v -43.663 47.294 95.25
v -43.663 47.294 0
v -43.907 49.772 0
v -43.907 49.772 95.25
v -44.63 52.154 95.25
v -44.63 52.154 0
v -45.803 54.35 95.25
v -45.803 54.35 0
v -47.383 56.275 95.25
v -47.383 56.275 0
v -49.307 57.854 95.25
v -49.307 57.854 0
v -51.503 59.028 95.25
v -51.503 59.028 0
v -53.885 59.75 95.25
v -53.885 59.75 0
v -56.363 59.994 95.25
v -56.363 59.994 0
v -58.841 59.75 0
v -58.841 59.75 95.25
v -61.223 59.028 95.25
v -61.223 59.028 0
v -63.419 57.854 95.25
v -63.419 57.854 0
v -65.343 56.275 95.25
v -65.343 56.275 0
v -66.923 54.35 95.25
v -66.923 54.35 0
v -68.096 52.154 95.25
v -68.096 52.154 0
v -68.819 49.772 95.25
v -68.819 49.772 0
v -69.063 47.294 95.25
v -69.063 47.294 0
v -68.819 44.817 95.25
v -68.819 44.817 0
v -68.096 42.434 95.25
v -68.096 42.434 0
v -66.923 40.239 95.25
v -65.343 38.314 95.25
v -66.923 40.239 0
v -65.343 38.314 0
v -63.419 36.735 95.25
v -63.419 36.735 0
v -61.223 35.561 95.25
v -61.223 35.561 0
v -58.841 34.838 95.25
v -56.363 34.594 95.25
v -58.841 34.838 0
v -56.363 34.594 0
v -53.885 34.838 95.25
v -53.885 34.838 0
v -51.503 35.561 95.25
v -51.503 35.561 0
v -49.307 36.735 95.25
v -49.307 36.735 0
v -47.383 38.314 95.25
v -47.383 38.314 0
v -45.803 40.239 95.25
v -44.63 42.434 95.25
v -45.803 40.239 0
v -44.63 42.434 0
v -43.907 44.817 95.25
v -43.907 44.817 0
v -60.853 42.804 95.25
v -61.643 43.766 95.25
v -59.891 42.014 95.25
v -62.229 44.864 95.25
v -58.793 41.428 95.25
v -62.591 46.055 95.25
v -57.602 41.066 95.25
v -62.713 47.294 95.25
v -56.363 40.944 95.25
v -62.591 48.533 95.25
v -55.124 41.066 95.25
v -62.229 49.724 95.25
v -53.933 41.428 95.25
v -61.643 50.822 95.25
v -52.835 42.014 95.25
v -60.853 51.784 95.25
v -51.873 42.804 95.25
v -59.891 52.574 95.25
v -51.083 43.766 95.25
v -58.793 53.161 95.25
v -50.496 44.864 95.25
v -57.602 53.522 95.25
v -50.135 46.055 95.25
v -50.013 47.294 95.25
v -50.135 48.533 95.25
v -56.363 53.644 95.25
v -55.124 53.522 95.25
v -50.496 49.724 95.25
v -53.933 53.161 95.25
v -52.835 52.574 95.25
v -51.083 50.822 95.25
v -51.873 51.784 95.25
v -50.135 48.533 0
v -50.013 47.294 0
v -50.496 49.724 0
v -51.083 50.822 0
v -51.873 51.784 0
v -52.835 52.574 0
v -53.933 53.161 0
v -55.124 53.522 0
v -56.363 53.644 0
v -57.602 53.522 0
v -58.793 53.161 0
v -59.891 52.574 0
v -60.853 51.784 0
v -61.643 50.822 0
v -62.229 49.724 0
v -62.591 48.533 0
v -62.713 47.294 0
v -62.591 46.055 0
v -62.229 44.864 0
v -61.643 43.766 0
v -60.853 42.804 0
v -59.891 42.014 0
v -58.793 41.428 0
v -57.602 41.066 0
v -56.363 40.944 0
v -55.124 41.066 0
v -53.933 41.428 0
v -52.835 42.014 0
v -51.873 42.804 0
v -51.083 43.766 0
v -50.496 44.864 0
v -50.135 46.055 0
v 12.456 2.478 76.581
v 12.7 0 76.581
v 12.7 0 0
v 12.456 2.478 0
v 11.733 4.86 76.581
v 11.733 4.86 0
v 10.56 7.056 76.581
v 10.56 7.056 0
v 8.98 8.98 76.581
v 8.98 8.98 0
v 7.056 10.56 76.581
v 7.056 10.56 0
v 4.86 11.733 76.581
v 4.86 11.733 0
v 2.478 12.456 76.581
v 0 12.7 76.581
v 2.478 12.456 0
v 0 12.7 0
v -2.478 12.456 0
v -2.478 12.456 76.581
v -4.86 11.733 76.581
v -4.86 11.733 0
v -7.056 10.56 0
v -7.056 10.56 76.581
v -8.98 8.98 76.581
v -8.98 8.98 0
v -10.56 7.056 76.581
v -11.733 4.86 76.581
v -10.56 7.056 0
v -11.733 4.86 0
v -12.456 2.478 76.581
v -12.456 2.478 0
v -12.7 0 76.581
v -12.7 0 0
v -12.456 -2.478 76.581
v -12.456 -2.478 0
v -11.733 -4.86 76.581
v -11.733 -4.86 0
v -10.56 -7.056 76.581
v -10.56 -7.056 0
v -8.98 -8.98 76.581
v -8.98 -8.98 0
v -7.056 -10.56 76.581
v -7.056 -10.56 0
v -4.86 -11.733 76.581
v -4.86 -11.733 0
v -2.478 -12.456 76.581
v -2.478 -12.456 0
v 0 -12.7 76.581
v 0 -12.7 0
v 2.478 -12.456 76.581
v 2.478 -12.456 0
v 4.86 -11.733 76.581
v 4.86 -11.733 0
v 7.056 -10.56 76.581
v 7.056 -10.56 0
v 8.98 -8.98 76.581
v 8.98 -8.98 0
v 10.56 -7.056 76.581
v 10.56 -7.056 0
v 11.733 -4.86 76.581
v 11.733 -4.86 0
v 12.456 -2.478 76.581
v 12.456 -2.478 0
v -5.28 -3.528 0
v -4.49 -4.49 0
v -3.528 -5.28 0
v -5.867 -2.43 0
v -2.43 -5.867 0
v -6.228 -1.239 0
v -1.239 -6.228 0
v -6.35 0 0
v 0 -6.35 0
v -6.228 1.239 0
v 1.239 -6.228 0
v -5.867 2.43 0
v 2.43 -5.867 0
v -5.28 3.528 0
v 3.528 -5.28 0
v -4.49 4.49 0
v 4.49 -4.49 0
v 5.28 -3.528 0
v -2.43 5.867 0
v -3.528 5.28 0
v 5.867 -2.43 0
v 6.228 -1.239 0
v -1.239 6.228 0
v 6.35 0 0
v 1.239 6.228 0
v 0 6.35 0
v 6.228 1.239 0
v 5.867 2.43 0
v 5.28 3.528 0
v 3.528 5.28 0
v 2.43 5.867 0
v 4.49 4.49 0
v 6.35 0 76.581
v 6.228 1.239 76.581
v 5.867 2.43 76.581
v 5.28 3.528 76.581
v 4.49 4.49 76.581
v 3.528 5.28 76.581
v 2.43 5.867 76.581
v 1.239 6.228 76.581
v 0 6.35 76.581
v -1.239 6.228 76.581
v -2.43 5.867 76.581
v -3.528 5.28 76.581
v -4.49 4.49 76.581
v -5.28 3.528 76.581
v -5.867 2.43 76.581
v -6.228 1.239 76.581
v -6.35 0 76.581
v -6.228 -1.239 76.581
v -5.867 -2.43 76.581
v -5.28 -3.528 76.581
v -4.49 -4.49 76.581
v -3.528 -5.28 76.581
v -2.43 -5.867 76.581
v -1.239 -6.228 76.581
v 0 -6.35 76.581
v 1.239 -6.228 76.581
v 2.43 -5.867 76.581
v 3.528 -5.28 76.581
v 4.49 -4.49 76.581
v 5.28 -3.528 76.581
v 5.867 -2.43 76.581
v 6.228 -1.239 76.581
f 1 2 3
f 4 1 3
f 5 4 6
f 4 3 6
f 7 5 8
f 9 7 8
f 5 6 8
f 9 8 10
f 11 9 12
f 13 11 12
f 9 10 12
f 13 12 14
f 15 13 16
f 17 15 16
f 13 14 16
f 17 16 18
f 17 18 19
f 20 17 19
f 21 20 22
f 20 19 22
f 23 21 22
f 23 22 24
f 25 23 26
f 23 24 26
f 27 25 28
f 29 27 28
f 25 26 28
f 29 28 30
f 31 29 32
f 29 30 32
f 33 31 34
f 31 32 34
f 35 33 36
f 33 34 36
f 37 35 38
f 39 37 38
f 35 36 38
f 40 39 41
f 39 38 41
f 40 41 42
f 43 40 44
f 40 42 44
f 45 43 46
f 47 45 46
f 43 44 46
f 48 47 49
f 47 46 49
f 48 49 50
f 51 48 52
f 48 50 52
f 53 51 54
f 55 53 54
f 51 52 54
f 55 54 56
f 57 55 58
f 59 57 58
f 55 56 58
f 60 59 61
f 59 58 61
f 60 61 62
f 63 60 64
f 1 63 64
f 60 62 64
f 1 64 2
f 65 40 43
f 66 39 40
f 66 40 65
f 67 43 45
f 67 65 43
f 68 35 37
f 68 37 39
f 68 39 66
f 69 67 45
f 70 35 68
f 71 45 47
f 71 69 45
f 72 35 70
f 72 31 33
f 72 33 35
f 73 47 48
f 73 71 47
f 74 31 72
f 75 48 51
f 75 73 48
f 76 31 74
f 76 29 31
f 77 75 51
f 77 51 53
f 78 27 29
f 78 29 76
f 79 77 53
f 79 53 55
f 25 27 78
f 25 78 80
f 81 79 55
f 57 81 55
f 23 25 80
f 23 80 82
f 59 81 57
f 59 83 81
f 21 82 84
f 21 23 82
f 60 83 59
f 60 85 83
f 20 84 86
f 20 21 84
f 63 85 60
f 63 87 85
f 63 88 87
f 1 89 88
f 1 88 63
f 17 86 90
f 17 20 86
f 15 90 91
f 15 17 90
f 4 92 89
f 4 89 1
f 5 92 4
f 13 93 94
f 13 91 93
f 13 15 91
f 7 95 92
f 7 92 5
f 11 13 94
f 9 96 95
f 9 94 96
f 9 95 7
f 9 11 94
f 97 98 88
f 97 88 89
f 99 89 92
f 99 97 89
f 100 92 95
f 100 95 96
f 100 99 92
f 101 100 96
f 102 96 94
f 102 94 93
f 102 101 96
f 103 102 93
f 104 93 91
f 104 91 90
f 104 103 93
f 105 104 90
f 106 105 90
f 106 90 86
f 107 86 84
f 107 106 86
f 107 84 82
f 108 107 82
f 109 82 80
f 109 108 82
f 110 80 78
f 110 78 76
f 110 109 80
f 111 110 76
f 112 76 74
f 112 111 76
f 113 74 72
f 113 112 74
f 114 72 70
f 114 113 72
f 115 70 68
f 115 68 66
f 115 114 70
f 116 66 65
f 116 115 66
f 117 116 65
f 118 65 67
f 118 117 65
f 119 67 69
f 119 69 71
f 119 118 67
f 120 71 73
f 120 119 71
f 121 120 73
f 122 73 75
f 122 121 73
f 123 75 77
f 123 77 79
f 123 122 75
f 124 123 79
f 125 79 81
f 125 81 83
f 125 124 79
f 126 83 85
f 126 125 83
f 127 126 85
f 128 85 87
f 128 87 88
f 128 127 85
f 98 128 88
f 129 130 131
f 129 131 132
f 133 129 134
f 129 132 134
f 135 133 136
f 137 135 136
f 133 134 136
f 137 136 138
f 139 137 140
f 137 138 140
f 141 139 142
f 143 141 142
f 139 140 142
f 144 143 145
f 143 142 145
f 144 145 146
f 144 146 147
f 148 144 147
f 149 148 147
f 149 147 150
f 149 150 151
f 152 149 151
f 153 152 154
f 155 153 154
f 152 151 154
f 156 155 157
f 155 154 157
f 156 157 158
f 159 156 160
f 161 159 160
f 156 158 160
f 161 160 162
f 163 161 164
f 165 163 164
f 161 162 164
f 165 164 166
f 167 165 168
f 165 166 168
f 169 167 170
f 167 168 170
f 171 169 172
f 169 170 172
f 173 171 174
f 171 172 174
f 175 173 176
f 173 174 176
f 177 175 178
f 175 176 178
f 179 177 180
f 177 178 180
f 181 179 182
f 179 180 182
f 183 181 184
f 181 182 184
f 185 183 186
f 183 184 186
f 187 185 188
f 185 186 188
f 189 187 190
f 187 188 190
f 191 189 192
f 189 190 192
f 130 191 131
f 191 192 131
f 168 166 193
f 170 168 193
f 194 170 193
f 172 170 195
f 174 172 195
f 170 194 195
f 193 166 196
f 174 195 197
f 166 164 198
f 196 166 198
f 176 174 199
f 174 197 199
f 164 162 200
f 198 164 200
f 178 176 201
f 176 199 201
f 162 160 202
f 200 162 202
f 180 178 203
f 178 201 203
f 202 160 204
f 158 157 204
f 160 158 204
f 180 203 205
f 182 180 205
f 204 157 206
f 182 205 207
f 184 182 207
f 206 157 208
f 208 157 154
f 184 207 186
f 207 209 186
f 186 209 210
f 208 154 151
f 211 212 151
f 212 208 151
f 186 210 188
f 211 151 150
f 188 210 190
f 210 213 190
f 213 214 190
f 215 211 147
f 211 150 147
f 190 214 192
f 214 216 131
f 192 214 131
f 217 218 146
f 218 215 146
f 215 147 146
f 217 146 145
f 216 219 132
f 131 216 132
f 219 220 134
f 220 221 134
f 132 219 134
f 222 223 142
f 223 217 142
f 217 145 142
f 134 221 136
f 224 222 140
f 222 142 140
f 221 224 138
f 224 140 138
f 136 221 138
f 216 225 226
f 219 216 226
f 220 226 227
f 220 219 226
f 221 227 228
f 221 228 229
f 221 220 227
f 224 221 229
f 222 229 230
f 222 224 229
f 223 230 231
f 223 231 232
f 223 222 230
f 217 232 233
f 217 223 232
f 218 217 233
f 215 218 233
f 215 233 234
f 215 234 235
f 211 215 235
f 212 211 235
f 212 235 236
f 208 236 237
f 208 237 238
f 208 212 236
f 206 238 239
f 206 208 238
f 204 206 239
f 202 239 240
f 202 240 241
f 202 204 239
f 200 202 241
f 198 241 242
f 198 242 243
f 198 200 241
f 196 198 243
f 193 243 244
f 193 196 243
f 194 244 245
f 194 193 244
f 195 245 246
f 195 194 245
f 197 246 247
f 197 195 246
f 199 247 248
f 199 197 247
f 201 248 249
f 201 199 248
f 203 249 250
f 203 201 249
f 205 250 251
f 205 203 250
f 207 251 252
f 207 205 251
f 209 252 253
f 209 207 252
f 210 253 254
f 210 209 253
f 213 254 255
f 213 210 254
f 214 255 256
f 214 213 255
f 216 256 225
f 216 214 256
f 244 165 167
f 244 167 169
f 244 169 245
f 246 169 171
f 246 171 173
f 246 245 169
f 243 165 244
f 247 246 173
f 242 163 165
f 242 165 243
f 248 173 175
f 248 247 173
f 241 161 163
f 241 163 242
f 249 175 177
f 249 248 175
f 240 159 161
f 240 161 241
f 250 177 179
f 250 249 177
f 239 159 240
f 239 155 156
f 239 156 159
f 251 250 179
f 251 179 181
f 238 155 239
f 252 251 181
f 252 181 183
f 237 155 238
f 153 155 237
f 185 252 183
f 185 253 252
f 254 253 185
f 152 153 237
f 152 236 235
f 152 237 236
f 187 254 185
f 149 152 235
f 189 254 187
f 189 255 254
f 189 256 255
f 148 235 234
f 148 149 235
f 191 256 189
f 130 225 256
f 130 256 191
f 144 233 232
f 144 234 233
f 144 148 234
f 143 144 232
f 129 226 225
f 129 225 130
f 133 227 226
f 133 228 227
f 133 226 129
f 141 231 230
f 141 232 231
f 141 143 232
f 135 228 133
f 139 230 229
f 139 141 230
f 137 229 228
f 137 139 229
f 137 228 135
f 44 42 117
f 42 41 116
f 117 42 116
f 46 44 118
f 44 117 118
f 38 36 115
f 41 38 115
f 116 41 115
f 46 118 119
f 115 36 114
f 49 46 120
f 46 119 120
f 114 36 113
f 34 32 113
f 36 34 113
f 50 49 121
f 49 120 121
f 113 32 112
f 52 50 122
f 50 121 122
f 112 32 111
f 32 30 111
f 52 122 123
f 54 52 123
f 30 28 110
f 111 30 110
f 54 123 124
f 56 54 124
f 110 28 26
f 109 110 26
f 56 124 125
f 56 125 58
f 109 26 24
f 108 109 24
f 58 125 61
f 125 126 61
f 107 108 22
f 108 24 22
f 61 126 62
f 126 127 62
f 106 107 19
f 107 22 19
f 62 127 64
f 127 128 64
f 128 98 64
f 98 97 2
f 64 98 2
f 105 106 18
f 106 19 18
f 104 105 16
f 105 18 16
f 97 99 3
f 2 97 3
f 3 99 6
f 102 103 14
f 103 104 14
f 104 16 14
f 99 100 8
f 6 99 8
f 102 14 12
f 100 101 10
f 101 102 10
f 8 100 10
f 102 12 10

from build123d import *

# Parameters (mm, degrees)
F0_R        = 12.7
F0_R_2      = 6.35
F1_DEPTH    = 95.25
F2_DEPTH    = 31.75
F2_FACE_R   = 12.7
F2_FACE_R_2 = 6.35
F3_DEPTH    = 44.831


with BuildPart() as f1:
    # F0 (on Top) → F1 (new body)
    with BuildSketch(Plane.XY):
        with Locations((-56.362856, 47.294293)):
            Circle(F0_R)
        with Locations((-56.362856, 47.294293)):
            Circle(F0_R_2, mode=Mode.SUBTRACT)
    extrude(amount=F1_DEPTH)


with BuildPart() as f2:
    # F0 (on Top) → F2 (new body)
    with BuildSketch(Plane.XY):
        Circle(F0_R)
        Circle(F0_R_2, mode=Mode.SUBTRACT)
    extrude(amount=F2_DEPTH)

    # F2_face (on face) → F3 (join)
    with BuildSketch(Plane.XY.offset(31.75)):
        Circle(F2_FACE_R)
        Circle(F2_FACE_R_2, mode=Mode.SUBTRACT)
    extrude(amount=F3_DEPTH)


solid = Compound([f1.part, f2.part])
